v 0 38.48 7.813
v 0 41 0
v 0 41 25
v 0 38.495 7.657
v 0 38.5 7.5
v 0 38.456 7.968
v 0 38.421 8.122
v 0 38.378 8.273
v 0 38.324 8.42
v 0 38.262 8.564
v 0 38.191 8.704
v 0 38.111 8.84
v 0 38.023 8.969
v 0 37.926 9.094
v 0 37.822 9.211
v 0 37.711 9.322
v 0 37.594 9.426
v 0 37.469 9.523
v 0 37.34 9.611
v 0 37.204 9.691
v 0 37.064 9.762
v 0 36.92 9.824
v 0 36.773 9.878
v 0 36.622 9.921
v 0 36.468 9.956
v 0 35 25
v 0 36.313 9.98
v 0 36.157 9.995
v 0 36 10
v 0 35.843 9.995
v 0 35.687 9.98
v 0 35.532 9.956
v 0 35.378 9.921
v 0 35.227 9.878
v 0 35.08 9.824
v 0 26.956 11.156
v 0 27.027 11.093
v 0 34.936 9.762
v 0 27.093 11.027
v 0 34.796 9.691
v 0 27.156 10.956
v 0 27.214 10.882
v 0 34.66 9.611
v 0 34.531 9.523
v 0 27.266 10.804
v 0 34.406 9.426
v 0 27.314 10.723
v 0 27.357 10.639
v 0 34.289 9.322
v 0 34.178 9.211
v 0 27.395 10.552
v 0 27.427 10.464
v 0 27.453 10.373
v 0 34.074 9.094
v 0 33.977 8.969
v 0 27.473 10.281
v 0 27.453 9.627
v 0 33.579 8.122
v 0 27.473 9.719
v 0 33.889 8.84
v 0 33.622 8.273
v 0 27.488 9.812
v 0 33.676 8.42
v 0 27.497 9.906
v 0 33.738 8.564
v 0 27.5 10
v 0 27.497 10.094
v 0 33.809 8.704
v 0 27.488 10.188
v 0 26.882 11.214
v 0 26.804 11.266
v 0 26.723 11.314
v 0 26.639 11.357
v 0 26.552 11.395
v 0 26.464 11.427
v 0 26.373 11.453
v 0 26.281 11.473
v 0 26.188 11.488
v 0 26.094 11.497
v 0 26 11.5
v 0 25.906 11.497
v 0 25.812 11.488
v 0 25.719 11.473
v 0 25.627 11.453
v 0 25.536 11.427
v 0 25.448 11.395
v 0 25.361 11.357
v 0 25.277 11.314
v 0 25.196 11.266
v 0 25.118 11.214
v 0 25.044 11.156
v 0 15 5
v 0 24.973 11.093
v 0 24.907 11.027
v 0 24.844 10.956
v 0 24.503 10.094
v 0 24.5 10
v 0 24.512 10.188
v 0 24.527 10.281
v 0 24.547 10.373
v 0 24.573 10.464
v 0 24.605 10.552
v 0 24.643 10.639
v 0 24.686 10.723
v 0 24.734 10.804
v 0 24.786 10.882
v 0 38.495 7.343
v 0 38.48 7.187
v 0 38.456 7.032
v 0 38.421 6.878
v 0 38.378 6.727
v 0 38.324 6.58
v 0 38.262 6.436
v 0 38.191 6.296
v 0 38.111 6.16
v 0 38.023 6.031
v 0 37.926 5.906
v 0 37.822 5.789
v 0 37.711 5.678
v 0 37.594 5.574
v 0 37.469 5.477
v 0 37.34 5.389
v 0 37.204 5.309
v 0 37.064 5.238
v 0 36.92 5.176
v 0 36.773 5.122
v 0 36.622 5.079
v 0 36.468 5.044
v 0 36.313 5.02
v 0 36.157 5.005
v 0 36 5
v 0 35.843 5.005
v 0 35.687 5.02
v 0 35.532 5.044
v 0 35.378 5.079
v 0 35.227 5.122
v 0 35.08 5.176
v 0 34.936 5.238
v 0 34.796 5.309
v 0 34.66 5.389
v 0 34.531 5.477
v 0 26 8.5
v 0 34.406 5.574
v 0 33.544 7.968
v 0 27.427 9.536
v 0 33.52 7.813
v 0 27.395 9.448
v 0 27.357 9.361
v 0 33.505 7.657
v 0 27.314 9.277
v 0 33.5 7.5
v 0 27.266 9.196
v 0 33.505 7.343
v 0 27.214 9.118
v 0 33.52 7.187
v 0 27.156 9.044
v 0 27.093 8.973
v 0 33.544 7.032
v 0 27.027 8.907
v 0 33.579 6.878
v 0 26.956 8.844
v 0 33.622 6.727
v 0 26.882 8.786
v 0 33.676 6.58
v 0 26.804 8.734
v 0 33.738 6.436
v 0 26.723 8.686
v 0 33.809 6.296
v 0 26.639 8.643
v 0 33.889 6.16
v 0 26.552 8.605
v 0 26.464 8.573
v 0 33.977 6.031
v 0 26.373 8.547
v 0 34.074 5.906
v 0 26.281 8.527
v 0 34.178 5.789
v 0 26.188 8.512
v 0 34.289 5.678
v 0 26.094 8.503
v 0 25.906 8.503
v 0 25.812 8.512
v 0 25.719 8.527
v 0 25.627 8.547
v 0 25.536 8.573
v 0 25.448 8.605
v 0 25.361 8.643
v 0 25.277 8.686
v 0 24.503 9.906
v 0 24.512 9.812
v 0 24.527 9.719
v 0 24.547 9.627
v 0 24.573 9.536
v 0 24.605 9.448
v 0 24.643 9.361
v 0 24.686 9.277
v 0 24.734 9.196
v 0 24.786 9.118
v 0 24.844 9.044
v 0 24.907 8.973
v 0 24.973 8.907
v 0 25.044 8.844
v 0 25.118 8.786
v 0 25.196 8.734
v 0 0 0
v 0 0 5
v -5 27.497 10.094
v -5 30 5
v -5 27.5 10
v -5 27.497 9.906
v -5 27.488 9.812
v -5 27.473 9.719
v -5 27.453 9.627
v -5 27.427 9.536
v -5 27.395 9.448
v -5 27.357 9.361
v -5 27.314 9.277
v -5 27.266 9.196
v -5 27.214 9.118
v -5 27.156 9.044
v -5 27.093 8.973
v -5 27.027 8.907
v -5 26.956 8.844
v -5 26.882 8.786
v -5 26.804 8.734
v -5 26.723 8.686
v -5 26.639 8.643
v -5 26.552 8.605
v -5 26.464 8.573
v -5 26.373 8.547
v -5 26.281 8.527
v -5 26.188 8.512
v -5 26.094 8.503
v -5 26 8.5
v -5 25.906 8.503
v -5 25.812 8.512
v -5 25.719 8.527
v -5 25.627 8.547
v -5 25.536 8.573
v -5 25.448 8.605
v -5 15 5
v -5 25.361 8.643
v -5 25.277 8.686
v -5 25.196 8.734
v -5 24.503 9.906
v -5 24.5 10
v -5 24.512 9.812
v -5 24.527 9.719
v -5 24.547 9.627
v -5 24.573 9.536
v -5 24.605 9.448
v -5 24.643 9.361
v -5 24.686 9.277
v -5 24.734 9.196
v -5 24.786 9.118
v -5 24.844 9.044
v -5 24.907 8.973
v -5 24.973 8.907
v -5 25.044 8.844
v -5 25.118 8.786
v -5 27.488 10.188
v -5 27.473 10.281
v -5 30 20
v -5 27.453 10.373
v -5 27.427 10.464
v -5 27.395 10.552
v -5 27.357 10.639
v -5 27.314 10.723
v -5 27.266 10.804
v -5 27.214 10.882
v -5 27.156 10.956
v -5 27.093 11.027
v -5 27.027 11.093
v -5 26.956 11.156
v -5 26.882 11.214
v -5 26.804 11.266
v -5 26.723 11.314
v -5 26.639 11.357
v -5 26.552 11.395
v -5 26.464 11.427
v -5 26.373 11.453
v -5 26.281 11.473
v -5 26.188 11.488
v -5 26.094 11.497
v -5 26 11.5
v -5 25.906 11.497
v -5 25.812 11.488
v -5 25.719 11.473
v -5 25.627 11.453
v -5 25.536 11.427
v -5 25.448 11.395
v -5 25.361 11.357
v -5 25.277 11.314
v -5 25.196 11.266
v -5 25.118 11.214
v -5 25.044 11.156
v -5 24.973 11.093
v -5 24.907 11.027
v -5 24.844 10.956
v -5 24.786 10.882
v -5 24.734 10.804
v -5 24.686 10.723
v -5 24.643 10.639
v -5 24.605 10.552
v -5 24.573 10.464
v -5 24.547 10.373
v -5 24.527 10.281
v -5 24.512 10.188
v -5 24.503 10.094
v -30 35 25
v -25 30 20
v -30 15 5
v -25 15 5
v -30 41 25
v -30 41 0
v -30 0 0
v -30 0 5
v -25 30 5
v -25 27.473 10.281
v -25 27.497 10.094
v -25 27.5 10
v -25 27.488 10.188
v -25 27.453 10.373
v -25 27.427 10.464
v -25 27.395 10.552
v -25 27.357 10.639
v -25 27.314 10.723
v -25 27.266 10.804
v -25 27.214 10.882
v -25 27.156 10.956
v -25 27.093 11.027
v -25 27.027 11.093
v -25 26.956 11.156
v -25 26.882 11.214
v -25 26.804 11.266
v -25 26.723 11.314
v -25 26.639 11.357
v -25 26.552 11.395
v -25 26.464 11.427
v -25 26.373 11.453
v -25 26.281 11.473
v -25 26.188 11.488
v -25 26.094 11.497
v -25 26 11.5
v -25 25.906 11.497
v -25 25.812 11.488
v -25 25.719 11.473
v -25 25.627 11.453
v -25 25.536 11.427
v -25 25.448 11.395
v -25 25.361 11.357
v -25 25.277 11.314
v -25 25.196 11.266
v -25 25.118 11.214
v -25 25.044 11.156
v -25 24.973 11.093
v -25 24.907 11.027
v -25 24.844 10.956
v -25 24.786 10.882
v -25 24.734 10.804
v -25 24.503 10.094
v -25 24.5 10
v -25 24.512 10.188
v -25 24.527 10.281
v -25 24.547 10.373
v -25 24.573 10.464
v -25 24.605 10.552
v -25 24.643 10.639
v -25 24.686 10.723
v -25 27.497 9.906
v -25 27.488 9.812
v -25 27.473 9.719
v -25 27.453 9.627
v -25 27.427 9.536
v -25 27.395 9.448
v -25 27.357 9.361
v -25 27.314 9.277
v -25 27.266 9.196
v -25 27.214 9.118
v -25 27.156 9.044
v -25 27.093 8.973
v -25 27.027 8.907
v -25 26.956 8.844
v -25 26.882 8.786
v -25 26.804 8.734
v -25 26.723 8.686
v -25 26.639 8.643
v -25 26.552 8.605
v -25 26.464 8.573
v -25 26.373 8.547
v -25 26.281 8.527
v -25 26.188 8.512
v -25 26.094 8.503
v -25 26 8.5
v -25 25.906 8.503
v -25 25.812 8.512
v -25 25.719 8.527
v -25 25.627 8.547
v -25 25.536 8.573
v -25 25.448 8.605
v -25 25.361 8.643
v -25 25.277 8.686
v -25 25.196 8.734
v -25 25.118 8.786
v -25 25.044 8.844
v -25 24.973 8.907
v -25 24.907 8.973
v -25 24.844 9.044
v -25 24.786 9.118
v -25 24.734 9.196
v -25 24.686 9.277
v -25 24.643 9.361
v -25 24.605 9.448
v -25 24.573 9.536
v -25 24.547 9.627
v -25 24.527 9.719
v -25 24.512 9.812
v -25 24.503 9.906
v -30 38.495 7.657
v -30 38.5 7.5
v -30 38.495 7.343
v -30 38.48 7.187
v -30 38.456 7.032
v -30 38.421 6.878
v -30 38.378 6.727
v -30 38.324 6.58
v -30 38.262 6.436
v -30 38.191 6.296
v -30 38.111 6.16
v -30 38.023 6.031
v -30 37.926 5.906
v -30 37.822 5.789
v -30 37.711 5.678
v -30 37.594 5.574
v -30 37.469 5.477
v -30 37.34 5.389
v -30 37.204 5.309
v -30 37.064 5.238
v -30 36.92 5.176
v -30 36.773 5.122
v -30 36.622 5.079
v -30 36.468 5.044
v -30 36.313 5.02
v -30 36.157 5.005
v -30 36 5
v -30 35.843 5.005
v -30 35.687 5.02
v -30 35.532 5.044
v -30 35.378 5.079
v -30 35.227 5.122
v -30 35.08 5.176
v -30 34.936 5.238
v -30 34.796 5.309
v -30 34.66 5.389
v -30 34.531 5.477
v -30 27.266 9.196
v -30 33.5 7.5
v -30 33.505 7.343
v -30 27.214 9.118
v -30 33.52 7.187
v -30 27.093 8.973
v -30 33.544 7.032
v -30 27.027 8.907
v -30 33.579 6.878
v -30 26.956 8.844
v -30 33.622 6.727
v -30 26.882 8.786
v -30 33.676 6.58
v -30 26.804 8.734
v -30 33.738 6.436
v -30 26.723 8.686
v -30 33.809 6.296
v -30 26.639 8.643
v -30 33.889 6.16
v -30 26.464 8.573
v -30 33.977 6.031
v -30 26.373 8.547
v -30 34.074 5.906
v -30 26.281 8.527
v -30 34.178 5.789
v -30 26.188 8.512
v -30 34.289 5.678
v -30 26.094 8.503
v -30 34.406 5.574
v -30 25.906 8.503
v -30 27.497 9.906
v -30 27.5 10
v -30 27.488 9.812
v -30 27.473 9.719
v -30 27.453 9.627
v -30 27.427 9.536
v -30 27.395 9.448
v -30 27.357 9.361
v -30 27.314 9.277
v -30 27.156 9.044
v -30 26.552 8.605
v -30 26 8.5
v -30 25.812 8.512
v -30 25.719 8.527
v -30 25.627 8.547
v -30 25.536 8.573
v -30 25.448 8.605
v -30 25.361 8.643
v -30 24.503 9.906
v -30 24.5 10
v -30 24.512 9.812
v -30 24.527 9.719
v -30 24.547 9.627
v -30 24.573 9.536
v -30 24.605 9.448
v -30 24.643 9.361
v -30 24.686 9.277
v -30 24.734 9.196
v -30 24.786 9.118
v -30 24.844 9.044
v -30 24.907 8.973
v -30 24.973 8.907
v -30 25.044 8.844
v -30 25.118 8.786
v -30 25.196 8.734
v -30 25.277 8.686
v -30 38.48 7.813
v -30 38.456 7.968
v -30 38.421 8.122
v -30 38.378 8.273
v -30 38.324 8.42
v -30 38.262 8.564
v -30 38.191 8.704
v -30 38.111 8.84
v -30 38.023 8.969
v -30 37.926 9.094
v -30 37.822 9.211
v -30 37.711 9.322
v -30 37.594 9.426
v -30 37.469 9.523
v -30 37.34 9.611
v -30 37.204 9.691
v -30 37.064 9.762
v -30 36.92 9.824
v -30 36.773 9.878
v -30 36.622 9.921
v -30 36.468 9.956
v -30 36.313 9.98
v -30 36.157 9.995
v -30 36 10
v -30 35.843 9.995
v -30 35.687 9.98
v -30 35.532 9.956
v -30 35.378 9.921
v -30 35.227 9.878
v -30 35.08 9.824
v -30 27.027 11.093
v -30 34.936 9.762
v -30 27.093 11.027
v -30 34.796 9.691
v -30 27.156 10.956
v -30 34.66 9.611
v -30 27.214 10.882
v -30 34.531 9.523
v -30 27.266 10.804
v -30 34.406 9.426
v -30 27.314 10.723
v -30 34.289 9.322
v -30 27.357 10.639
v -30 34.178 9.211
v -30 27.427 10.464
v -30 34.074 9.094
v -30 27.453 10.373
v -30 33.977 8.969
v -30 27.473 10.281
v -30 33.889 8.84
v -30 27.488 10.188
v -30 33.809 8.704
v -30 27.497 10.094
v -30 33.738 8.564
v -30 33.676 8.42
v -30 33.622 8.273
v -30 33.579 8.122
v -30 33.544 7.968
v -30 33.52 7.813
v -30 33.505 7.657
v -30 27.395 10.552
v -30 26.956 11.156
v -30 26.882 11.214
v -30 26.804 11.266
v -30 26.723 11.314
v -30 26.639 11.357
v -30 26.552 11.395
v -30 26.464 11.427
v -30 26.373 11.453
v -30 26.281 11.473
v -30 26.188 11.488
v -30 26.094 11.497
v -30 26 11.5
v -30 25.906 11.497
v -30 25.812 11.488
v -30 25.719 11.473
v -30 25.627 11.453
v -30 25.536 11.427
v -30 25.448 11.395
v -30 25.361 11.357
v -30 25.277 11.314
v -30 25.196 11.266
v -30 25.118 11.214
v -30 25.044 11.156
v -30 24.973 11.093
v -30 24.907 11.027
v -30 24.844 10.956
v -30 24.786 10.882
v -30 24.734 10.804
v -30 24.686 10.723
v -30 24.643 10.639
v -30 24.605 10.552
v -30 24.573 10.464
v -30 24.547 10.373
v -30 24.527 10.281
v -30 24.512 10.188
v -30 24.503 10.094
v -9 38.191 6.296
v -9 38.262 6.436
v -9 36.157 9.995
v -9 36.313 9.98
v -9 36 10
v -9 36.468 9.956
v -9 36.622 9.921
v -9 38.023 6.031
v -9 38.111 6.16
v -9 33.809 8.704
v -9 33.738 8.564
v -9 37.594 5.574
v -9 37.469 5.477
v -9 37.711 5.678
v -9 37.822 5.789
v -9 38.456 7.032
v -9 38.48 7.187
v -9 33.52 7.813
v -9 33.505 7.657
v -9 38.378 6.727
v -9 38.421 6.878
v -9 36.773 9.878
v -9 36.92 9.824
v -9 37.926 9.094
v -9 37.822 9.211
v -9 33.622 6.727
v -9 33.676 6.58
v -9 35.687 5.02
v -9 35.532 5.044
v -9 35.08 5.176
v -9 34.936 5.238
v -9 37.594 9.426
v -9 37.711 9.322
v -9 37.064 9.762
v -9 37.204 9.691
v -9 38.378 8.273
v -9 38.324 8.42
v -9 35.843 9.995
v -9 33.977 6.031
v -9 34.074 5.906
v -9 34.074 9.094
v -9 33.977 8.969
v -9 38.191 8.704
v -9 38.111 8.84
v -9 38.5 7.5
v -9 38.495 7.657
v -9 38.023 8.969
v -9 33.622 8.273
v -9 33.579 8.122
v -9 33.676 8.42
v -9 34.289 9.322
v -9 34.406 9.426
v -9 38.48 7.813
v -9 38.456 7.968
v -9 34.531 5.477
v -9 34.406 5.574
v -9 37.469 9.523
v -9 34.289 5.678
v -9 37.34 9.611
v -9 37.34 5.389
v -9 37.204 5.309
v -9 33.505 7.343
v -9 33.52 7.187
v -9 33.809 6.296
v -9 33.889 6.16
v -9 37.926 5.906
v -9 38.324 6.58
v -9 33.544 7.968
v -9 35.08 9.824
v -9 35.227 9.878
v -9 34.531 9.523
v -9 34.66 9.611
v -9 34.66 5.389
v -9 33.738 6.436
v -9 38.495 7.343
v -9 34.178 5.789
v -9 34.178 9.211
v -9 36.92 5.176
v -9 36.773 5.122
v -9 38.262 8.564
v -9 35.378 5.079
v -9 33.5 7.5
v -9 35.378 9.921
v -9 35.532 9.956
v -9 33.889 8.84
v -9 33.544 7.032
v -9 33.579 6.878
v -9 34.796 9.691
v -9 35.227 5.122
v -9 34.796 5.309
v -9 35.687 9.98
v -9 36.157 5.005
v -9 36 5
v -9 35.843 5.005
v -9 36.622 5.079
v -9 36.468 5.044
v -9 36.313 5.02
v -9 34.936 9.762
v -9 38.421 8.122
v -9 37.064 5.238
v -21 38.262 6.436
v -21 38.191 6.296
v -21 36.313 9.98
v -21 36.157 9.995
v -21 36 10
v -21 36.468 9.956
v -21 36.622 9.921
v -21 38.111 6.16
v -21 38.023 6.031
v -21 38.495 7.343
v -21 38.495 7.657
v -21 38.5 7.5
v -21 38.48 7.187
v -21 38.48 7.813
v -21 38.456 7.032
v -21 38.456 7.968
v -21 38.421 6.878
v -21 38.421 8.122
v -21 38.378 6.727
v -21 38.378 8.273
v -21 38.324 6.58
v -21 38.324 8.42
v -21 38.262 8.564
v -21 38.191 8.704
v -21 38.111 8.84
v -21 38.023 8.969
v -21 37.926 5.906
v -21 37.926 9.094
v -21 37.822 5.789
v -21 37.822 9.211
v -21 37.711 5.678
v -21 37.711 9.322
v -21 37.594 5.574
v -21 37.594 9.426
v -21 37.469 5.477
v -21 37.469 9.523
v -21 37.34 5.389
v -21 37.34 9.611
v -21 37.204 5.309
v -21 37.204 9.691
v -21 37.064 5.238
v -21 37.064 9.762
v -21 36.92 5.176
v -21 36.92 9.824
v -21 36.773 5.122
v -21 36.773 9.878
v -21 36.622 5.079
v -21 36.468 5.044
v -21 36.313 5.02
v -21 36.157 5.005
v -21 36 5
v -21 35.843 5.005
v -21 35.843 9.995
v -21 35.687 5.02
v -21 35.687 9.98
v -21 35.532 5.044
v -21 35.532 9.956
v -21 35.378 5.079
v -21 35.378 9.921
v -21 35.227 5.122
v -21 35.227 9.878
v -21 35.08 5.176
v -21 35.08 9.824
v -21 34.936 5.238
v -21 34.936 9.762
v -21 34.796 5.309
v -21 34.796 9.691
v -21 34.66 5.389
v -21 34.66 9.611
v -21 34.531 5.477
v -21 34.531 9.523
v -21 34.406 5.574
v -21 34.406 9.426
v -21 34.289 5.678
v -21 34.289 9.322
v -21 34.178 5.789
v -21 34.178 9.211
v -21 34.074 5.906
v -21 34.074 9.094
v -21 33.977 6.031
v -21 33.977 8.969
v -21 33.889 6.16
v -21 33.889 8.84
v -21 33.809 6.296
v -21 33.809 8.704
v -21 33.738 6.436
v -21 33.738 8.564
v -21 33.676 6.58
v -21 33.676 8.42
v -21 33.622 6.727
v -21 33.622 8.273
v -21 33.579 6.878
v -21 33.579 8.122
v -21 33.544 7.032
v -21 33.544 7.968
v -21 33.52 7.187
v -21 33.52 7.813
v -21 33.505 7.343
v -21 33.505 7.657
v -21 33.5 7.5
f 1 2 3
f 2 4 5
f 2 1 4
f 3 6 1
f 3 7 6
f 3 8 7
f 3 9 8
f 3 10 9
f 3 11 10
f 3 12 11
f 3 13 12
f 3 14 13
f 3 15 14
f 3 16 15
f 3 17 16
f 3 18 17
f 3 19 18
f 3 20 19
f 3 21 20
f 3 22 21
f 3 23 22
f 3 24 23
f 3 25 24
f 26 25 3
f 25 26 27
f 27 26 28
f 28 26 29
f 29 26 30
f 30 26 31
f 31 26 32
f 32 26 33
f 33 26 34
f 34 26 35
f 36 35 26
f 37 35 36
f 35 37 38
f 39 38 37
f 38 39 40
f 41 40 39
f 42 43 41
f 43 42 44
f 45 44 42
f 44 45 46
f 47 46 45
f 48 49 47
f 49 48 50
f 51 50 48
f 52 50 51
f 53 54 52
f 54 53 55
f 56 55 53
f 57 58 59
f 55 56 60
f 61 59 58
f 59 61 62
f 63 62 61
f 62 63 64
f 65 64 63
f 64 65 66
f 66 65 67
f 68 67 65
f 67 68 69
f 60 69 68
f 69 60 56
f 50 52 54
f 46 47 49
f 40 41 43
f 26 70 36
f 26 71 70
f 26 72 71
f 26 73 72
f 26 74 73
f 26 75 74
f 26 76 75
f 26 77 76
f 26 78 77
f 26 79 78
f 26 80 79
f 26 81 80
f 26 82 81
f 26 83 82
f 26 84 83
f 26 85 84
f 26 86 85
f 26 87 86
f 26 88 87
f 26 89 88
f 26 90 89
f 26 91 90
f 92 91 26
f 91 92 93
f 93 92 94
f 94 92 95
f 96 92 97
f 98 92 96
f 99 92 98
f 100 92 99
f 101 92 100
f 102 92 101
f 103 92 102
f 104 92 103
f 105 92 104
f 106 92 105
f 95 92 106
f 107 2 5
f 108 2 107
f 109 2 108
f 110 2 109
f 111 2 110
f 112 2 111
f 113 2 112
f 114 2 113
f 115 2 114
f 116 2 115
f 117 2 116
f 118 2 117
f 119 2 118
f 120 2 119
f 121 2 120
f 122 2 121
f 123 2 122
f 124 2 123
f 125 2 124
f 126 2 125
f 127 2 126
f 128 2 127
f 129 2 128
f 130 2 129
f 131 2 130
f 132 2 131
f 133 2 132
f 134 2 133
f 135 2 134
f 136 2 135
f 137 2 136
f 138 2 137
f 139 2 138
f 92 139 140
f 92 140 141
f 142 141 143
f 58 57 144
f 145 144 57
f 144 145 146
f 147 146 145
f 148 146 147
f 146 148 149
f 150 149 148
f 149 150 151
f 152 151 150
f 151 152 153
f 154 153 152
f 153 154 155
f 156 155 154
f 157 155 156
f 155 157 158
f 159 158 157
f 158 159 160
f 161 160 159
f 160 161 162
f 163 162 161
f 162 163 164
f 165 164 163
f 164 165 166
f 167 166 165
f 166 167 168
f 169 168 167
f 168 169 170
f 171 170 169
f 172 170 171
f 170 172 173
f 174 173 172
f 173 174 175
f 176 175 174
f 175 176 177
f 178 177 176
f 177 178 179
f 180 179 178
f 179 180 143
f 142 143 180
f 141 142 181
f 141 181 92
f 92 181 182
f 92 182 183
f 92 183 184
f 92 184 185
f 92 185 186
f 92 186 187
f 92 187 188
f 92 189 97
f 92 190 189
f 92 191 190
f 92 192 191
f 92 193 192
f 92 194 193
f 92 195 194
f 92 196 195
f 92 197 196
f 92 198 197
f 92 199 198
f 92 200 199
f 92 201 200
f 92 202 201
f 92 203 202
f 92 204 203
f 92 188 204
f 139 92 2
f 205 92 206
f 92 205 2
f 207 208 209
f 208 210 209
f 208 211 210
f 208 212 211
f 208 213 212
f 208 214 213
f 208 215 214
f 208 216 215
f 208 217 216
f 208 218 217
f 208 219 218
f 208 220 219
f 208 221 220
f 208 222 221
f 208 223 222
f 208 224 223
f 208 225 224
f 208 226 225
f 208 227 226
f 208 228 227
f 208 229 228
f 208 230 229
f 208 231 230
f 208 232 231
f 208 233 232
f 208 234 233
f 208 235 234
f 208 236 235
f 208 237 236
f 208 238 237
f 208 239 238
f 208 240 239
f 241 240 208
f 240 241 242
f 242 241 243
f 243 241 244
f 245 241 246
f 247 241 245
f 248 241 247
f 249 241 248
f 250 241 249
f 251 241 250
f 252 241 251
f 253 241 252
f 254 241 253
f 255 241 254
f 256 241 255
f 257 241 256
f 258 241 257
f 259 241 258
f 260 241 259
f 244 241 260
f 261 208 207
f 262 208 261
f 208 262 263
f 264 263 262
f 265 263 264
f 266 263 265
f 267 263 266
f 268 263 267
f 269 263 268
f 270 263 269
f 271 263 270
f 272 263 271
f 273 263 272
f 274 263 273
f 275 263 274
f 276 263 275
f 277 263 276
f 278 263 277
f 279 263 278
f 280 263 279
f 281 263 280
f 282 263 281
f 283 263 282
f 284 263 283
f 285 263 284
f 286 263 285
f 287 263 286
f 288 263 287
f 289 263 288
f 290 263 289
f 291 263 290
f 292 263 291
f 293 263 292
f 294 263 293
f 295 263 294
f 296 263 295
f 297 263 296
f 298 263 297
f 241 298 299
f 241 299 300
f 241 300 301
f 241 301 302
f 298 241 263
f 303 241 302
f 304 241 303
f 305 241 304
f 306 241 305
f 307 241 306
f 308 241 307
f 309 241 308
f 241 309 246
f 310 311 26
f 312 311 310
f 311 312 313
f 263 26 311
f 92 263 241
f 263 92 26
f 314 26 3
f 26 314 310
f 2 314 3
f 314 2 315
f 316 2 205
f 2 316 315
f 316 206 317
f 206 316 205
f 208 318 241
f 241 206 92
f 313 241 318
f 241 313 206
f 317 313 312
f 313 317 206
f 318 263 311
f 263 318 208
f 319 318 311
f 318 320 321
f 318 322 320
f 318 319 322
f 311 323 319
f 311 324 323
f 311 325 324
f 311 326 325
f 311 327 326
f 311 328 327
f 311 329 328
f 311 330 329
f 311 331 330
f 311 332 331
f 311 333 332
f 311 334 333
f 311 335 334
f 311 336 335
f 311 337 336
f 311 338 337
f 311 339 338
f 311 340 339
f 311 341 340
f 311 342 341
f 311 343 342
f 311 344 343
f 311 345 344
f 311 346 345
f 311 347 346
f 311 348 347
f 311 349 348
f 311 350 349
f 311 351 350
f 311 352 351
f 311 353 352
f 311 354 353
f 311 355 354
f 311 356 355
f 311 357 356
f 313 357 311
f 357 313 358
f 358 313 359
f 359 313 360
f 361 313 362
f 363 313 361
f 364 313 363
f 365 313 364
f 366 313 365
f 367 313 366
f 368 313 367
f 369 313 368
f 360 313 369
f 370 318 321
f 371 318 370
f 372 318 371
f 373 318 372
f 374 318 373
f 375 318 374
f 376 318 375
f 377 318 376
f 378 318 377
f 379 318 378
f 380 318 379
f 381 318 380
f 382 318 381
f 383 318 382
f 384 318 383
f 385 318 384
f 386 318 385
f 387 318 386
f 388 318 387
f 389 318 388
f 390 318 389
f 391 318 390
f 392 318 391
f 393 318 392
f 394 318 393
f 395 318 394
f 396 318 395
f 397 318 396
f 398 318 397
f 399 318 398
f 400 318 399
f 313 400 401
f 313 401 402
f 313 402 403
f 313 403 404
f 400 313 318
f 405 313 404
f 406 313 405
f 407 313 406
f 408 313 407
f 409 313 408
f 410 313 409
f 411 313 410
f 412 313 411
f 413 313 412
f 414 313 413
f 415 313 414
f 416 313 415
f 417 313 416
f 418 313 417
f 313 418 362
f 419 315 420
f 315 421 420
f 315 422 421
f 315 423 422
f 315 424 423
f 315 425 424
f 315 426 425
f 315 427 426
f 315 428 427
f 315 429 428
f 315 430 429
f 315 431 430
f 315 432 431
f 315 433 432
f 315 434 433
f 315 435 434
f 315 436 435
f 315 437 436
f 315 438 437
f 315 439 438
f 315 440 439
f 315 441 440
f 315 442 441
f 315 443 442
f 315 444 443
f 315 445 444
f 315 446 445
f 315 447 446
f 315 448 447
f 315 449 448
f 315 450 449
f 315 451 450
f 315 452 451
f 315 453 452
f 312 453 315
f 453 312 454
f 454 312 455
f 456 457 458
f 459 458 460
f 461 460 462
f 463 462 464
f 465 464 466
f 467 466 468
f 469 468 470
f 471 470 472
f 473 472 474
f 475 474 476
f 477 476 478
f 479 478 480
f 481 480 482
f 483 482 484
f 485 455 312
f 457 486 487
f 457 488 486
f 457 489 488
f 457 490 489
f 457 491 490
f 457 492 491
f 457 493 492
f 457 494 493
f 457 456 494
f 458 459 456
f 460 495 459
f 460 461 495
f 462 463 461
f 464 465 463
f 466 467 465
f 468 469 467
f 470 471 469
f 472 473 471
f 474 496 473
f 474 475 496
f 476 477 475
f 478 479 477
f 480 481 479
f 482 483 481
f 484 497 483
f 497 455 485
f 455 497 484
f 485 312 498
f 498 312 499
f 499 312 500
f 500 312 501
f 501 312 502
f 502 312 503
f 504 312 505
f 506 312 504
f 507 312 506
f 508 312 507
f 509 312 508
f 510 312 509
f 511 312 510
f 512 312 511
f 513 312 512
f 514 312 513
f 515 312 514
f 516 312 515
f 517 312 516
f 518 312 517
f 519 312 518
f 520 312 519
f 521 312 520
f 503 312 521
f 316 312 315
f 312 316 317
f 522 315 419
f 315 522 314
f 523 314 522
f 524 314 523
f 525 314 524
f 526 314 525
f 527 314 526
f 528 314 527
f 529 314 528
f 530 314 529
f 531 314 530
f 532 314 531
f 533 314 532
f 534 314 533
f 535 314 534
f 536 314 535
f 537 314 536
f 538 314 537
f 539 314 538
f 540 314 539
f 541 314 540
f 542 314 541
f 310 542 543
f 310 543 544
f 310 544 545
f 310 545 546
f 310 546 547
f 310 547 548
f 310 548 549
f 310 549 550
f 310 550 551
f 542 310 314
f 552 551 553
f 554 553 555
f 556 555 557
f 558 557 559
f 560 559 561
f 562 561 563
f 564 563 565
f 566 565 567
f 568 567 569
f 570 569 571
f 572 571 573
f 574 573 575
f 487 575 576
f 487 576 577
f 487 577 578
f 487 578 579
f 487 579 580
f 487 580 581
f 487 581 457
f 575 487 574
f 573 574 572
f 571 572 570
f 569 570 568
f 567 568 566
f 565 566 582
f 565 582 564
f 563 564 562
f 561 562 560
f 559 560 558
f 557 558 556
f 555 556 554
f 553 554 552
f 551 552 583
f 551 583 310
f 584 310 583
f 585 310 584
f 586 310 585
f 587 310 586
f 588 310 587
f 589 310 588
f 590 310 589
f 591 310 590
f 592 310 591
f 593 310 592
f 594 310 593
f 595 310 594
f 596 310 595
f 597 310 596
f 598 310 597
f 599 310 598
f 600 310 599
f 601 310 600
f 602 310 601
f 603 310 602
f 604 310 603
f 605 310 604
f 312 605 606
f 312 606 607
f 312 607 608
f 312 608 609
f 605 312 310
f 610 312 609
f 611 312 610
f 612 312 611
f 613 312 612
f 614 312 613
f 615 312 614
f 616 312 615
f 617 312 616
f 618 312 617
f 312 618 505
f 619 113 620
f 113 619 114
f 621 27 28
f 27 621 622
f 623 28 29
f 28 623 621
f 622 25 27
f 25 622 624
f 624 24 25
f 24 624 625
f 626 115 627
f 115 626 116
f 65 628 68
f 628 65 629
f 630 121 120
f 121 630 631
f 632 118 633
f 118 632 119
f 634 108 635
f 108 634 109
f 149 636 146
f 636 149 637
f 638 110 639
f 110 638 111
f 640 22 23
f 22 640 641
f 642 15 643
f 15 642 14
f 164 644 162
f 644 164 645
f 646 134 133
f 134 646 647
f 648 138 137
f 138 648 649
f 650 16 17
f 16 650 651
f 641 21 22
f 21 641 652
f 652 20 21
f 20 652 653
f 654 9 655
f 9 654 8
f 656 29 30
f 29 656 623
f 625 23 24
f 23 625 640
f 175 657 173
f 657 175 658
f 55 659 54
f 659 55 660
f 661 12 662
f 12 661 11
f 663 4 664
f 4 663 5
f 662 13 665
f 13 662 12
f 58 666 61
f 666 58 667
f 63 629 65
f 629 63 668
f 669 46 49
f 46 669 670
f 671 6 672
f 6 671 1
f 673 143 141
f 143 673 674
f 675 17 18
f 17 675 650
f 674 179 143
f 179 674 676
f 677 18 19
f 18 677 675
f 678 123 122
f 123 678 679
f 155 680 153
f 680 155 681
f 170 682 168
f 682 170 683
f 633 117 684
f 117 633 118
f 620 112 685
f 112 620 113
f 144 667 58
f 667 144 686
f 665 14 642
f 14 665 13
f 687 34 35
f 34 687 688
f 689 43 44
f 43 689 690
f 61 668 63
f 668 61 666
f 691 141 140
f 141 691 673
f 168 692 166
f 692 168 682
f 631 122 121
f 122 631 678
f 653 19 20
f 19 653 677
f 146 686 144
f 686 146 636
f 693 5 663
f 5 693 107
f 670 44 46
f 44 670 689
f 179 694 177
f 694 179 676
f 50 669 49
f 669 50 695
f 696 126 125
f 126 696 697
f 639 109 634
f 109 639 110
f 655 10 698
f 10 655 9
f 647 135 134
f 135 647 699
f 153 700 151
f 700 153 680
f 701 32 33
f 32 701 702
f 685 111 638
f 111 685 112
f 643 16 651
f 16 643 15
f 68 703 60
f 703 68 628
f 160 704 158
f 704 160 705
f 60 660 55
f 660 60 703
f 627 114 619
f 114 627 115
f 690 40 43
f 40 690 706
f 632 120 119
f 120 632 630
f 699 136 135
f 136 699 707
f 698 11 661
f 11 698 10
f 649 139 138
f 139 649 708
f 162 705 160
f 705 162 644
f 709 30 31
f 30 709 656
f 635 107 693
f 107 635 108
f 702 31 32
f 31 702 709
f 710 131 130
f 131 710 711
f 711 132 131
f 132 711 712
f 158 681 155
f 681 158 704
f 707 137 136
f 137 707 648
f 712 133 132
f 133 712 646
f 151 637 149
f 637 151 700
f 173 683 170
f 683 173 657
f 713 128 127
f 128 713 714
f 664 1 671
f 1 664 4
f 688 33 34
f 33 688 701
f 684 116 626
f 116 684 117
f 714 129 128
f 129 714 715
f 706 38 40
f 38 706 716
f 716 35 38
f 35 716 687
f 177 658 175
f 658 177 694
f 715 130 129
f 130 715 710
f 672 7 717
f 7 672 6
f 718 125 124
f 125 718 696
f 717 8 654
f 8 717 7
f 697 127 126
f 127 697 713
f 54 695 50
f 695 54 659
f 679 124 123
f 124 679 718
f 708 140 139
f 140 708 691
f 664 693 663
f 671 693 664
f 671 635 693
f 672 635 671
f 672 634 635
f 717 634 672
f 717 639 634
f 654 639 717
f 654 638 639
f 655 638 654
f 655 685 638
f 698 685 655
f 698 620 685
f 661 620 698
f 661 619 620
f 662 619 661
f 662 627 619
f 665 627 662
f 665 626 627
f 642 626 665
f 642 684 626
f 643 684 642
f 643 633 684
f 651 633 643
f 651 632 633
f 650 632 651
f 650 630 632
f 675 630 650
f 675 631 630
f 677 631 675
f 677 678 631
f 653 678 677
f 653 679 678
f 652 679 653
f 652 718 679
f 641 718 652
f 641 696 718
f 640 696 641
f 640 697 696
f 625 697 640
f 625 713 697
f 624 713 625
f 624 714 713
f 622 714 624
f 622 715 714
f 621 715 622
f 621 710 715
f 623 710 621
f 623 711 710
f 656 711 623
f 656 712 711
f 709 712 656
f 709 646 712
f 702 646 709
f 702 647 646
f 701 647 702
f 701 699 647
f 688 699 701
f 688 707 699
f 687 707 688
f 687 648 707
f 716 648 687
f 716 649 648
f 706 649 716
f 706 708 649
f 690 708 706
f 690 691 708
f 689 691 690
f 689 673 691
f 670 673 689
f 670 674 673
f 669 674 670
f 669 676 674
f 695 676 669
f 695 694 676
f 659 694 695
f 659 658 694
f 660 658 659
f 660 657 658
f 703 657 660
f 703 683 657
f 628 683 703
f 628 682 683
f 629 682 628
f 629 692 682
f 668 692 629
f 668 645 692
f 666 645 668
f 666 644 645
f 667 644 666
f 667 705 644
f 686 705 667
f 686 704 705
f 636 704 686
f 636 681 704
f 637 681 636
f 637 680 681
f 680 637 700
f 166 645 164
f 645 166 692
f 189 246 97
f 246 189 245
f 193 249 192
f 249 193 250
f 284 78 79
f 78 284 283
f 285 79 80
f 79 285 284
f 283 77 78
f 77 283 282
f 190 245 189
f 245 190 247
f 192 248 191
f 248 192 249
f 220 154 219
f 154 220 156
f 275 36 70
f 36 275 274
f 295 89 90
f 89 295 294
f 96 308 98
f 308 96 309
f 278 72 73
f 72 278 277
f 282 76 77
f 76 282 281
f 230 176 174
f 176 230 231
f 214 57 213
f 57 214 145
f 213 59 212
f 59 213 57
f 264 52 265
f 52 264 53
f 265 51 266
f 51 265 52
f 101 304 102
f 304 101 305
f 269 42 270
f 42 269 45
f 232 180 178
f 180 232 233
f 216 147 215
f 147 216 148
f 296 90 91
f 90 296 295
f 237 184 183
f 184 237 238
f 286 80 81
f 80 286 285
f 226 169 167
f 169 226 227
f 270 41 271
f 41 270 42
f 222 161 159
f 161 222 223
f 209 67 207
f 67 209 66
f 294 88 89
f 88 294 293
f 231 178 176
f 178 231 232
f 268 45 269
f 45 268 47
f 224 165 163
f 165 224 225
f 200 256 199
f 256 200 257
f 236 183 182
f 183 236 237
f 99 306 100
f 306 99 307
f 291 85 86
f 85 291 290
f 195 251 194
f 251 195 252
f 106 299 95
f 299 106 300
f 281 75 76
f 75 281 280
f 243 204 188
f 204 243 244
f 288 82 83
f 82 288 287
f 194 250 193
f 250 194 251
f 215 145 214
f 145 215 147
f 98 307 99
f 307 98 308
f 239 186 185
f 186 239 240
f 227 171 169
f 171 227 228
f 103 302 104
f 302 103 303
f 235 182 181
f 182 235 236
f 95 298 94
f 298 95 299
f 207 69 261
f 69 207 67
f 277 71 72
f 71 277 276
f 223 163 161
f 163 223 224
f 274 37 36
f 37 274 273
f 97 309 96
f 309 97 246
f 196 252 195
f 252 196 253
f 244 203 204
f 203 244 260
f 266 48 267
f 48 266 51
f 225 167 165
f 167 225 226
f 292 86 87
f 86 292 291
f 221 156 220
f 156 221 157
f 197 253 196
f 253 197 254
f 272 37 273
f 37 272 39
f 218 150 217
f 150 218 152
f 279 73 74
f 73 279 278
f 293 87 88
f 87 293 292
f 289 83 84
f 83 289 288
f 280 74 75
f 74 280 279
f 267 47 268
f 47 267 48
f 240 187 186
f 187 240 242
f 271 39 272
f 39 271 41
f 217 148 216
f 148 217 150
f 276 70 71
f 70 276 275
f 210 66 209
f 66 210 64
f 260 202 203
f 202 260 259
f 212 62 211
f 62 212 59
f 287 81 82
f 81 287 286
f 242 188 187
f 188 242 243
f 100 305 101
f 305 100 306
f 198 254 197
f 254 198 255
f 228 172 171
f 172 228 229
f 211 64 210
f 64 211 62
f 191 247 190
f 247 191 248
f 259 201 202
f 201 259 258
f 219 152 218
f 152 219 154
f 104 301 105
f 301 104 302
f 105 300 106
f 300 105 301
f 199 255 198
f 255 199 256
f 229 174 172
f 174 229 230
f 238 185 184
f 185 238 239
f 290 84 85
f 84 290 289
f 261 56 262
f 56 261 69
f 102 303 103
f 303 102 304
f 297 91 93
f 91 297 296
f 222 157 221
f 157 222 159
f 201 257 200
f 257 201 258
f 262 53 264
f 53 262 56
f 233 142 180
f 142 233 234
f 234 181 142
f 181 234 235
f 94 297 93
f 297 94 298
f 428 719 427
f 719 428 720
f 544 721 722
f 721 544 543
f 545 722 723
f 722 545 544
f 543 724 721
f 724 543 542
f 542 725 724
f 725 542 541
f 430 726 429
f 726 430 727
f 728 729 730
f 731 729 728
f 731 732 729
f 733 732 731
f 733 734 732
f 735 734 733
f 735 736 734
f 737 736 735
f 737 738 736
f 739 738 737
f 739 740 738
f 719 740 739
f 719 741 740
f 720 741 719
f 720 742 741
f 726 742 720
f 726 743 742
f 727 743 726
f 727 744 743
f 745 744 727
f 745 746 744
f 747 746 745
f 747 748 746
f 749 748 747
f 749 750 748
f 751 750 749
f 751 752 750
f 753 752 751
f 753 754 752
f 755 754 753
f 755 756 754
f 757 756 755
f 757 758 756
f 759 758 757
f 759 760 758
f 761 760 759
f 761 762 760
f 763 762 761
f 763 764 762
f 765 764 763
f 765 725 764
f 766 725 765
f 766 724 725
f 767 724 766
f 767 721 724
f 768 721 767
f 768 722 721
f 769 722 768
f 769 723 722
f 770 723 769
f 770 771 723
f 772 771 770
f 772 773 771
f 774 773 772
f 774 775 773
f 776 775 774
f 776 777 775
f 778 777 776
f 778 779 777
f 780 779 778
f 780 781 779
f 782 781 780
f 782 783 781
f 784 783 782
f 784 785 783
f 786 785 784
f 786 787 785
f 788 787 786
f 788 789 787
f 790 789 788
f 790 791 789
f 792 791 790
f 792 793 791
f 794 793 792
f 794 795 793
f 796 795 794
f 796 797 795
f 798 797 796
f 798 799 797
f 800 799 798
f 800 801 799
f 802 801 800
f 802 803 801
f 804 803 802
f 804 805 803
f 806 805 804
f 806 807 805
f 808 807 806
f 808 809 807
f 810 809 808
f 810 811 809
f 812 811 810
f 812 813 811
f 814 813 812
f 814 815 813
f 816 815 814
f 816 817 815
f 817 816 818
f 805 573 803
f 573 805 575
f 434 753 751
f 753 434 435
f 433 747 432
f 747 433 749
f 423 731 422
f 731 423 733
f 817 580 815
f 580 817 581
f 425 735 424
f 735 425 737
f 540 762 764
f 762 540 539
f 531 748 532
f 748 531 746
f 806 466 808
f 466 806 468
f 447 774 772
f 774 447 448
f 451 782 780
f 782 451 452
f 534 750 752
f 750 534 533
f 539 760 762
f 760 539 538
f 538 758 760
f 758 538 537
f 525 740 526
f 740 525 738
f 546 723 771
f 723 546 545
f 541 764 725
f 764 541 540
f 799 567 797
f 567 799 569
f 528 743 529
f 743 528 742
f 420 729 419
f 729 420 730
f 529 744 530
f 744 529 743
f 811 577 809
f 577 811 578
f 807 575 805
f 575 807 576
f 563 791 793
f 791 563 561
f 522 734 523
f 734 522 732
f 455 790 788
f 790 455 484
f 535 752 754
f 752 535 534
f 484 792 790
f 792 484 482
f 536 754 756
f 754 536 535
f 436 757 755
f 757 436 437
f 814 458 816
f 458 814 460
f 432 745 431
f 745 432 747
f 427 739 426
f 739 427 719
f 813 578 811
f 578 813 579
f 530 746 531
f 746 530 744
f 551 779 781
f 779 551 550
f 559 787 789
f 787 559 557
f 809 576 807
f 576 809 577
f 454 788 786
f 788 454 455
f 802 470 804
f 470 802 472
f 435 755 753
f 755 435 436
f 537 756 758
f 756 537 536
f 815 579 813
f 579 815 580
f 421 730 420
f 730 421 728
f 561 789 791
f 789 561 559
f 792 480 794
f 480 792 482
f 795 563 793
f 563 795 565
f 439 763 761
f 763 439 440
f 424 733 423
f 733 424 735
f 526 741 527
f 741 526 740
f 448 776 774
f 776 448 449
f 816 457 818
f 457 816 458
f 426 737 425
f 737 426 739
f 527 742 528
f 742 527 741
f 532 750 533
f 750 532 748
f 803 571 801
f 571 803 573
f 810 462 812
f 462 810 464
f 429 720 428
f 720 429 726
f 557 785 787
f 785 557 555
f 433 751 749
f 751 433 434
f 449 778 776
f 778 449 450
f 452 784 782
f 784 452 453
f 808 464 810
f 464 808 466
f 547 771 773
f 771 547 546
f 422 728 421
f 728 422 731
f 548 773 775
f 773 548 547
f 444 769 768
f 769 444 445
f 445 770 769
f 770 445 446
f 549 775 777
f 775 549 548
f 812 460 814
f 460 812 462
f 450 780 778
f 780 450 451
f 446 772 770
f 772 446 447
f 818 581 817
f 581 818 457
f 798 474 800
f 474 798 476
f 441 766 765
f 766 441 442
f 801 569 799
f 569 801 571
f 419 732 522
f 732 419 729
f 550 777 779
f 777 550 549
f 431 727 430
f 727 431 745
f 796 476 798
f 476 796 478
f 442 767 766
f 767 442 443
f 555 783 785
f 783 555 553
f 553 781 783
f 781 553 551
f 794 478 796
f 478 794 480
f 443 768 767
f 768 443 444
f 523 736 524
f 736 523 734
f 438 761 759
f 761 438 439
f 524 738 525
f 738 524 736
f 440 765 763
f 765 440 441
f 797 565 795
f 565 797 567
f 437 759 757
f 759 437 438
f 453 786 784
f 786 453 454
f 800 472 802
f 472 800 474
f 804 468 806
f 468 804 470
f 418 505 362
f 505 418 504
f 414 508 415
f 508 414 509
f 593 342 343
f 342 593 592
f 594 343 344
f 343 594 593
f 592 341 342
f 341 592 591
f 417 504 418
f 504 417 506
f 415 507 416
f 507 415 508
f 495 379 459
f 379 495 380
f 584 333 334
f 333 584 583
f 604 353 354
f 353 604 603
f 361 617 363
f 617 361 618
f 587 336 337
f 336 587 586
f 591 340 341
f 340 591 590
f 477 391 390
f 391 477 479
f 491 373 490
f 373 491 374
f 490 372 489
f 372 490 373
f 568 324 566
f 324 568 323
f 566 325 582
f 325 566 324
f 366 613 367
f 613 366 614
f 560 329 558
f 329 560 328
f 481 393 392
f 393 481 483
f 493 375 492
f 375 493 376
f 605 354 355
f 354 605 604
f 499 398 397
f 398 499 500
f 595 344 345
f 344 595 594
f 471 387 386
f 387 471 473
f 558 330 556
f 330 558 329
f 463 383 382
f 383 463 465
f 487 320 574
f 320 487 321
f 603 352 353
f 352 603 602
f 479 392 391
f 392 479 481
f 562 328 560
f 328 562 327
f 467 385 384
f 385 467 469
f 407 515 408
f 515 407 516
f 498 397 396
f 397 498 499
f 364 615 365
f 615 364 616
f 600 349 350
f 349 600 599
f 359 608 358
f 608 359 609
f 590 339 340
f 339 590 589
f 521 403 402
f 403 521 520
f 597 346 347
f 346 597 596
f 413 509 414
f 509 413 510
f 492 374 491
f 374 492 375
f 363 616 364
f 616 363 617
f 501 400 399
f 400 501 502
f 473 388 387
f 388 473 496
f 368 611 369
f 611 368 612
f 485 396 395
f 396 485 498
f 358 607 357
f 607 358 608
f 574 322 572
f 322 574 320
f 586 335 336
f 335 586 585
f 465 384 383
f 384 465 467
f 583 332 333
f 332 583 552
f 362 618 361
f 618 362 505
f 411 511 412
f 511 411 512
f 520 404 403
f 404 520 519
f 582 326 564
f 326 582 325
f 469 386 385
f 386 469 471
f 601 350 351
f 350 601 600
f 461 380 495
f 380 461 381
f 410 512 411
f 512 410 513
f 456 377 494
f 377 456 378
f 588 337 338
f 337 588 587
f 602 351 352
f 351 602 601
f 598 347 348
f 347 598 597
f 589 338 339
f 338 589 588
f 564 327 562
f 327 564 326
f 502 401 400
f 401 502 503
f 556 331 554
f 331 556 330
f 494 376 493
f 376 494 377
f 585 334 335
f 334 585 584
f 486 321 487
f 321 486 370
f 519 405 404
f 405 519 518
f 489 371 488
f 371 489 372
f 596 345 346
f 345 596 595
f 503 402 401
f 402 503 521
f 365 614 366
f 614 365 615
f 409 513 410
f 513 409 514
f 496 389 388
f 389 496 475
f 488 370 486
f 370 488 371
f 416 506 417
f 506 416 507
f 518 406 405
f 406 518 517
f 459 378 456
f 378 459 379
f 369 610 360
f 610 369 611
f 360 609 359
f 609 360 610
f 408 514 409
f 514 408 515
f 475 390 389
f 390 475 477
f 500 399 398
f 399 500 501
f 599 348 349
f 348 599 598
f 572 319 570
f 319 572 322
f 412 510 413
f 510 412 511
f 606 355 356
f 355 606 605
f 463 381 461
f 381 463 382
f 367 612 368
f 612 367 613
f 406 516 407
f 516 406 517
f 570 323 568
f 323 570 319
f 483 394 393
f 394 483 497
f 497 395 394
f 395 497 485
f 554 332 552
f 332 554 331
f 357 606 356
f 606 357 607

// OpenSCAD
module wall(){
    linear_extrude(5) {
        polygon([
            [ 0,  0],
            [ 0, 41],
            [25, 41],
            [25, 35],
            [ 5, 15],
            [ 5,  0]
        ]);
    }
}
module body(size) {
    linear_extrude(size)
        polygon([
            [ 0,  0],
            [ 0, 41],
            [25, 41],
            [25, 35],
            [20, 30],
            [ 5, 30],
            [ 5,  0]
        ]);
}
module piece(width) {
    wall();
    translate([0,0,4.5])
        body(width - 9);
    translate([0, 0, width -5])
        wall();
}
$fn=100;
module c3(width = 60, topScrews = false) {
    rotate([0, -90, 0])
        difference() {
            piece(width);
            
            // right pin hole
            translate([7.5, 36, -9])
                #cylinder(18, d=5);
            // right screw hole
            translate([10, 26, -2])
                cylinder(12, d=3); 
            // left pin hole
            translate([7.5, 36, width - 9])
                #cylinder(18, d=5);
            // left screw hole
            translate([10, 26, width - 8])
                cylinder(12, d=3); 
            // top screws
            screwCount = ceil((width - 50) / 50);
            initial = (width - ((screwCount - 1) * 50)) / 2;
            echo(screwCount, initial);
            
            if (topScrews) {
                rotate ([0, 90, 0]) {
                    for(screwx = [0 : 1 : screwCount - 1]) {
                        translate([-initial + screwx * -50, 15, -2.5])
                        #cylinder(h=10, d=3);
                    }
                }
            }
        }
    }
 c3(30, false);
